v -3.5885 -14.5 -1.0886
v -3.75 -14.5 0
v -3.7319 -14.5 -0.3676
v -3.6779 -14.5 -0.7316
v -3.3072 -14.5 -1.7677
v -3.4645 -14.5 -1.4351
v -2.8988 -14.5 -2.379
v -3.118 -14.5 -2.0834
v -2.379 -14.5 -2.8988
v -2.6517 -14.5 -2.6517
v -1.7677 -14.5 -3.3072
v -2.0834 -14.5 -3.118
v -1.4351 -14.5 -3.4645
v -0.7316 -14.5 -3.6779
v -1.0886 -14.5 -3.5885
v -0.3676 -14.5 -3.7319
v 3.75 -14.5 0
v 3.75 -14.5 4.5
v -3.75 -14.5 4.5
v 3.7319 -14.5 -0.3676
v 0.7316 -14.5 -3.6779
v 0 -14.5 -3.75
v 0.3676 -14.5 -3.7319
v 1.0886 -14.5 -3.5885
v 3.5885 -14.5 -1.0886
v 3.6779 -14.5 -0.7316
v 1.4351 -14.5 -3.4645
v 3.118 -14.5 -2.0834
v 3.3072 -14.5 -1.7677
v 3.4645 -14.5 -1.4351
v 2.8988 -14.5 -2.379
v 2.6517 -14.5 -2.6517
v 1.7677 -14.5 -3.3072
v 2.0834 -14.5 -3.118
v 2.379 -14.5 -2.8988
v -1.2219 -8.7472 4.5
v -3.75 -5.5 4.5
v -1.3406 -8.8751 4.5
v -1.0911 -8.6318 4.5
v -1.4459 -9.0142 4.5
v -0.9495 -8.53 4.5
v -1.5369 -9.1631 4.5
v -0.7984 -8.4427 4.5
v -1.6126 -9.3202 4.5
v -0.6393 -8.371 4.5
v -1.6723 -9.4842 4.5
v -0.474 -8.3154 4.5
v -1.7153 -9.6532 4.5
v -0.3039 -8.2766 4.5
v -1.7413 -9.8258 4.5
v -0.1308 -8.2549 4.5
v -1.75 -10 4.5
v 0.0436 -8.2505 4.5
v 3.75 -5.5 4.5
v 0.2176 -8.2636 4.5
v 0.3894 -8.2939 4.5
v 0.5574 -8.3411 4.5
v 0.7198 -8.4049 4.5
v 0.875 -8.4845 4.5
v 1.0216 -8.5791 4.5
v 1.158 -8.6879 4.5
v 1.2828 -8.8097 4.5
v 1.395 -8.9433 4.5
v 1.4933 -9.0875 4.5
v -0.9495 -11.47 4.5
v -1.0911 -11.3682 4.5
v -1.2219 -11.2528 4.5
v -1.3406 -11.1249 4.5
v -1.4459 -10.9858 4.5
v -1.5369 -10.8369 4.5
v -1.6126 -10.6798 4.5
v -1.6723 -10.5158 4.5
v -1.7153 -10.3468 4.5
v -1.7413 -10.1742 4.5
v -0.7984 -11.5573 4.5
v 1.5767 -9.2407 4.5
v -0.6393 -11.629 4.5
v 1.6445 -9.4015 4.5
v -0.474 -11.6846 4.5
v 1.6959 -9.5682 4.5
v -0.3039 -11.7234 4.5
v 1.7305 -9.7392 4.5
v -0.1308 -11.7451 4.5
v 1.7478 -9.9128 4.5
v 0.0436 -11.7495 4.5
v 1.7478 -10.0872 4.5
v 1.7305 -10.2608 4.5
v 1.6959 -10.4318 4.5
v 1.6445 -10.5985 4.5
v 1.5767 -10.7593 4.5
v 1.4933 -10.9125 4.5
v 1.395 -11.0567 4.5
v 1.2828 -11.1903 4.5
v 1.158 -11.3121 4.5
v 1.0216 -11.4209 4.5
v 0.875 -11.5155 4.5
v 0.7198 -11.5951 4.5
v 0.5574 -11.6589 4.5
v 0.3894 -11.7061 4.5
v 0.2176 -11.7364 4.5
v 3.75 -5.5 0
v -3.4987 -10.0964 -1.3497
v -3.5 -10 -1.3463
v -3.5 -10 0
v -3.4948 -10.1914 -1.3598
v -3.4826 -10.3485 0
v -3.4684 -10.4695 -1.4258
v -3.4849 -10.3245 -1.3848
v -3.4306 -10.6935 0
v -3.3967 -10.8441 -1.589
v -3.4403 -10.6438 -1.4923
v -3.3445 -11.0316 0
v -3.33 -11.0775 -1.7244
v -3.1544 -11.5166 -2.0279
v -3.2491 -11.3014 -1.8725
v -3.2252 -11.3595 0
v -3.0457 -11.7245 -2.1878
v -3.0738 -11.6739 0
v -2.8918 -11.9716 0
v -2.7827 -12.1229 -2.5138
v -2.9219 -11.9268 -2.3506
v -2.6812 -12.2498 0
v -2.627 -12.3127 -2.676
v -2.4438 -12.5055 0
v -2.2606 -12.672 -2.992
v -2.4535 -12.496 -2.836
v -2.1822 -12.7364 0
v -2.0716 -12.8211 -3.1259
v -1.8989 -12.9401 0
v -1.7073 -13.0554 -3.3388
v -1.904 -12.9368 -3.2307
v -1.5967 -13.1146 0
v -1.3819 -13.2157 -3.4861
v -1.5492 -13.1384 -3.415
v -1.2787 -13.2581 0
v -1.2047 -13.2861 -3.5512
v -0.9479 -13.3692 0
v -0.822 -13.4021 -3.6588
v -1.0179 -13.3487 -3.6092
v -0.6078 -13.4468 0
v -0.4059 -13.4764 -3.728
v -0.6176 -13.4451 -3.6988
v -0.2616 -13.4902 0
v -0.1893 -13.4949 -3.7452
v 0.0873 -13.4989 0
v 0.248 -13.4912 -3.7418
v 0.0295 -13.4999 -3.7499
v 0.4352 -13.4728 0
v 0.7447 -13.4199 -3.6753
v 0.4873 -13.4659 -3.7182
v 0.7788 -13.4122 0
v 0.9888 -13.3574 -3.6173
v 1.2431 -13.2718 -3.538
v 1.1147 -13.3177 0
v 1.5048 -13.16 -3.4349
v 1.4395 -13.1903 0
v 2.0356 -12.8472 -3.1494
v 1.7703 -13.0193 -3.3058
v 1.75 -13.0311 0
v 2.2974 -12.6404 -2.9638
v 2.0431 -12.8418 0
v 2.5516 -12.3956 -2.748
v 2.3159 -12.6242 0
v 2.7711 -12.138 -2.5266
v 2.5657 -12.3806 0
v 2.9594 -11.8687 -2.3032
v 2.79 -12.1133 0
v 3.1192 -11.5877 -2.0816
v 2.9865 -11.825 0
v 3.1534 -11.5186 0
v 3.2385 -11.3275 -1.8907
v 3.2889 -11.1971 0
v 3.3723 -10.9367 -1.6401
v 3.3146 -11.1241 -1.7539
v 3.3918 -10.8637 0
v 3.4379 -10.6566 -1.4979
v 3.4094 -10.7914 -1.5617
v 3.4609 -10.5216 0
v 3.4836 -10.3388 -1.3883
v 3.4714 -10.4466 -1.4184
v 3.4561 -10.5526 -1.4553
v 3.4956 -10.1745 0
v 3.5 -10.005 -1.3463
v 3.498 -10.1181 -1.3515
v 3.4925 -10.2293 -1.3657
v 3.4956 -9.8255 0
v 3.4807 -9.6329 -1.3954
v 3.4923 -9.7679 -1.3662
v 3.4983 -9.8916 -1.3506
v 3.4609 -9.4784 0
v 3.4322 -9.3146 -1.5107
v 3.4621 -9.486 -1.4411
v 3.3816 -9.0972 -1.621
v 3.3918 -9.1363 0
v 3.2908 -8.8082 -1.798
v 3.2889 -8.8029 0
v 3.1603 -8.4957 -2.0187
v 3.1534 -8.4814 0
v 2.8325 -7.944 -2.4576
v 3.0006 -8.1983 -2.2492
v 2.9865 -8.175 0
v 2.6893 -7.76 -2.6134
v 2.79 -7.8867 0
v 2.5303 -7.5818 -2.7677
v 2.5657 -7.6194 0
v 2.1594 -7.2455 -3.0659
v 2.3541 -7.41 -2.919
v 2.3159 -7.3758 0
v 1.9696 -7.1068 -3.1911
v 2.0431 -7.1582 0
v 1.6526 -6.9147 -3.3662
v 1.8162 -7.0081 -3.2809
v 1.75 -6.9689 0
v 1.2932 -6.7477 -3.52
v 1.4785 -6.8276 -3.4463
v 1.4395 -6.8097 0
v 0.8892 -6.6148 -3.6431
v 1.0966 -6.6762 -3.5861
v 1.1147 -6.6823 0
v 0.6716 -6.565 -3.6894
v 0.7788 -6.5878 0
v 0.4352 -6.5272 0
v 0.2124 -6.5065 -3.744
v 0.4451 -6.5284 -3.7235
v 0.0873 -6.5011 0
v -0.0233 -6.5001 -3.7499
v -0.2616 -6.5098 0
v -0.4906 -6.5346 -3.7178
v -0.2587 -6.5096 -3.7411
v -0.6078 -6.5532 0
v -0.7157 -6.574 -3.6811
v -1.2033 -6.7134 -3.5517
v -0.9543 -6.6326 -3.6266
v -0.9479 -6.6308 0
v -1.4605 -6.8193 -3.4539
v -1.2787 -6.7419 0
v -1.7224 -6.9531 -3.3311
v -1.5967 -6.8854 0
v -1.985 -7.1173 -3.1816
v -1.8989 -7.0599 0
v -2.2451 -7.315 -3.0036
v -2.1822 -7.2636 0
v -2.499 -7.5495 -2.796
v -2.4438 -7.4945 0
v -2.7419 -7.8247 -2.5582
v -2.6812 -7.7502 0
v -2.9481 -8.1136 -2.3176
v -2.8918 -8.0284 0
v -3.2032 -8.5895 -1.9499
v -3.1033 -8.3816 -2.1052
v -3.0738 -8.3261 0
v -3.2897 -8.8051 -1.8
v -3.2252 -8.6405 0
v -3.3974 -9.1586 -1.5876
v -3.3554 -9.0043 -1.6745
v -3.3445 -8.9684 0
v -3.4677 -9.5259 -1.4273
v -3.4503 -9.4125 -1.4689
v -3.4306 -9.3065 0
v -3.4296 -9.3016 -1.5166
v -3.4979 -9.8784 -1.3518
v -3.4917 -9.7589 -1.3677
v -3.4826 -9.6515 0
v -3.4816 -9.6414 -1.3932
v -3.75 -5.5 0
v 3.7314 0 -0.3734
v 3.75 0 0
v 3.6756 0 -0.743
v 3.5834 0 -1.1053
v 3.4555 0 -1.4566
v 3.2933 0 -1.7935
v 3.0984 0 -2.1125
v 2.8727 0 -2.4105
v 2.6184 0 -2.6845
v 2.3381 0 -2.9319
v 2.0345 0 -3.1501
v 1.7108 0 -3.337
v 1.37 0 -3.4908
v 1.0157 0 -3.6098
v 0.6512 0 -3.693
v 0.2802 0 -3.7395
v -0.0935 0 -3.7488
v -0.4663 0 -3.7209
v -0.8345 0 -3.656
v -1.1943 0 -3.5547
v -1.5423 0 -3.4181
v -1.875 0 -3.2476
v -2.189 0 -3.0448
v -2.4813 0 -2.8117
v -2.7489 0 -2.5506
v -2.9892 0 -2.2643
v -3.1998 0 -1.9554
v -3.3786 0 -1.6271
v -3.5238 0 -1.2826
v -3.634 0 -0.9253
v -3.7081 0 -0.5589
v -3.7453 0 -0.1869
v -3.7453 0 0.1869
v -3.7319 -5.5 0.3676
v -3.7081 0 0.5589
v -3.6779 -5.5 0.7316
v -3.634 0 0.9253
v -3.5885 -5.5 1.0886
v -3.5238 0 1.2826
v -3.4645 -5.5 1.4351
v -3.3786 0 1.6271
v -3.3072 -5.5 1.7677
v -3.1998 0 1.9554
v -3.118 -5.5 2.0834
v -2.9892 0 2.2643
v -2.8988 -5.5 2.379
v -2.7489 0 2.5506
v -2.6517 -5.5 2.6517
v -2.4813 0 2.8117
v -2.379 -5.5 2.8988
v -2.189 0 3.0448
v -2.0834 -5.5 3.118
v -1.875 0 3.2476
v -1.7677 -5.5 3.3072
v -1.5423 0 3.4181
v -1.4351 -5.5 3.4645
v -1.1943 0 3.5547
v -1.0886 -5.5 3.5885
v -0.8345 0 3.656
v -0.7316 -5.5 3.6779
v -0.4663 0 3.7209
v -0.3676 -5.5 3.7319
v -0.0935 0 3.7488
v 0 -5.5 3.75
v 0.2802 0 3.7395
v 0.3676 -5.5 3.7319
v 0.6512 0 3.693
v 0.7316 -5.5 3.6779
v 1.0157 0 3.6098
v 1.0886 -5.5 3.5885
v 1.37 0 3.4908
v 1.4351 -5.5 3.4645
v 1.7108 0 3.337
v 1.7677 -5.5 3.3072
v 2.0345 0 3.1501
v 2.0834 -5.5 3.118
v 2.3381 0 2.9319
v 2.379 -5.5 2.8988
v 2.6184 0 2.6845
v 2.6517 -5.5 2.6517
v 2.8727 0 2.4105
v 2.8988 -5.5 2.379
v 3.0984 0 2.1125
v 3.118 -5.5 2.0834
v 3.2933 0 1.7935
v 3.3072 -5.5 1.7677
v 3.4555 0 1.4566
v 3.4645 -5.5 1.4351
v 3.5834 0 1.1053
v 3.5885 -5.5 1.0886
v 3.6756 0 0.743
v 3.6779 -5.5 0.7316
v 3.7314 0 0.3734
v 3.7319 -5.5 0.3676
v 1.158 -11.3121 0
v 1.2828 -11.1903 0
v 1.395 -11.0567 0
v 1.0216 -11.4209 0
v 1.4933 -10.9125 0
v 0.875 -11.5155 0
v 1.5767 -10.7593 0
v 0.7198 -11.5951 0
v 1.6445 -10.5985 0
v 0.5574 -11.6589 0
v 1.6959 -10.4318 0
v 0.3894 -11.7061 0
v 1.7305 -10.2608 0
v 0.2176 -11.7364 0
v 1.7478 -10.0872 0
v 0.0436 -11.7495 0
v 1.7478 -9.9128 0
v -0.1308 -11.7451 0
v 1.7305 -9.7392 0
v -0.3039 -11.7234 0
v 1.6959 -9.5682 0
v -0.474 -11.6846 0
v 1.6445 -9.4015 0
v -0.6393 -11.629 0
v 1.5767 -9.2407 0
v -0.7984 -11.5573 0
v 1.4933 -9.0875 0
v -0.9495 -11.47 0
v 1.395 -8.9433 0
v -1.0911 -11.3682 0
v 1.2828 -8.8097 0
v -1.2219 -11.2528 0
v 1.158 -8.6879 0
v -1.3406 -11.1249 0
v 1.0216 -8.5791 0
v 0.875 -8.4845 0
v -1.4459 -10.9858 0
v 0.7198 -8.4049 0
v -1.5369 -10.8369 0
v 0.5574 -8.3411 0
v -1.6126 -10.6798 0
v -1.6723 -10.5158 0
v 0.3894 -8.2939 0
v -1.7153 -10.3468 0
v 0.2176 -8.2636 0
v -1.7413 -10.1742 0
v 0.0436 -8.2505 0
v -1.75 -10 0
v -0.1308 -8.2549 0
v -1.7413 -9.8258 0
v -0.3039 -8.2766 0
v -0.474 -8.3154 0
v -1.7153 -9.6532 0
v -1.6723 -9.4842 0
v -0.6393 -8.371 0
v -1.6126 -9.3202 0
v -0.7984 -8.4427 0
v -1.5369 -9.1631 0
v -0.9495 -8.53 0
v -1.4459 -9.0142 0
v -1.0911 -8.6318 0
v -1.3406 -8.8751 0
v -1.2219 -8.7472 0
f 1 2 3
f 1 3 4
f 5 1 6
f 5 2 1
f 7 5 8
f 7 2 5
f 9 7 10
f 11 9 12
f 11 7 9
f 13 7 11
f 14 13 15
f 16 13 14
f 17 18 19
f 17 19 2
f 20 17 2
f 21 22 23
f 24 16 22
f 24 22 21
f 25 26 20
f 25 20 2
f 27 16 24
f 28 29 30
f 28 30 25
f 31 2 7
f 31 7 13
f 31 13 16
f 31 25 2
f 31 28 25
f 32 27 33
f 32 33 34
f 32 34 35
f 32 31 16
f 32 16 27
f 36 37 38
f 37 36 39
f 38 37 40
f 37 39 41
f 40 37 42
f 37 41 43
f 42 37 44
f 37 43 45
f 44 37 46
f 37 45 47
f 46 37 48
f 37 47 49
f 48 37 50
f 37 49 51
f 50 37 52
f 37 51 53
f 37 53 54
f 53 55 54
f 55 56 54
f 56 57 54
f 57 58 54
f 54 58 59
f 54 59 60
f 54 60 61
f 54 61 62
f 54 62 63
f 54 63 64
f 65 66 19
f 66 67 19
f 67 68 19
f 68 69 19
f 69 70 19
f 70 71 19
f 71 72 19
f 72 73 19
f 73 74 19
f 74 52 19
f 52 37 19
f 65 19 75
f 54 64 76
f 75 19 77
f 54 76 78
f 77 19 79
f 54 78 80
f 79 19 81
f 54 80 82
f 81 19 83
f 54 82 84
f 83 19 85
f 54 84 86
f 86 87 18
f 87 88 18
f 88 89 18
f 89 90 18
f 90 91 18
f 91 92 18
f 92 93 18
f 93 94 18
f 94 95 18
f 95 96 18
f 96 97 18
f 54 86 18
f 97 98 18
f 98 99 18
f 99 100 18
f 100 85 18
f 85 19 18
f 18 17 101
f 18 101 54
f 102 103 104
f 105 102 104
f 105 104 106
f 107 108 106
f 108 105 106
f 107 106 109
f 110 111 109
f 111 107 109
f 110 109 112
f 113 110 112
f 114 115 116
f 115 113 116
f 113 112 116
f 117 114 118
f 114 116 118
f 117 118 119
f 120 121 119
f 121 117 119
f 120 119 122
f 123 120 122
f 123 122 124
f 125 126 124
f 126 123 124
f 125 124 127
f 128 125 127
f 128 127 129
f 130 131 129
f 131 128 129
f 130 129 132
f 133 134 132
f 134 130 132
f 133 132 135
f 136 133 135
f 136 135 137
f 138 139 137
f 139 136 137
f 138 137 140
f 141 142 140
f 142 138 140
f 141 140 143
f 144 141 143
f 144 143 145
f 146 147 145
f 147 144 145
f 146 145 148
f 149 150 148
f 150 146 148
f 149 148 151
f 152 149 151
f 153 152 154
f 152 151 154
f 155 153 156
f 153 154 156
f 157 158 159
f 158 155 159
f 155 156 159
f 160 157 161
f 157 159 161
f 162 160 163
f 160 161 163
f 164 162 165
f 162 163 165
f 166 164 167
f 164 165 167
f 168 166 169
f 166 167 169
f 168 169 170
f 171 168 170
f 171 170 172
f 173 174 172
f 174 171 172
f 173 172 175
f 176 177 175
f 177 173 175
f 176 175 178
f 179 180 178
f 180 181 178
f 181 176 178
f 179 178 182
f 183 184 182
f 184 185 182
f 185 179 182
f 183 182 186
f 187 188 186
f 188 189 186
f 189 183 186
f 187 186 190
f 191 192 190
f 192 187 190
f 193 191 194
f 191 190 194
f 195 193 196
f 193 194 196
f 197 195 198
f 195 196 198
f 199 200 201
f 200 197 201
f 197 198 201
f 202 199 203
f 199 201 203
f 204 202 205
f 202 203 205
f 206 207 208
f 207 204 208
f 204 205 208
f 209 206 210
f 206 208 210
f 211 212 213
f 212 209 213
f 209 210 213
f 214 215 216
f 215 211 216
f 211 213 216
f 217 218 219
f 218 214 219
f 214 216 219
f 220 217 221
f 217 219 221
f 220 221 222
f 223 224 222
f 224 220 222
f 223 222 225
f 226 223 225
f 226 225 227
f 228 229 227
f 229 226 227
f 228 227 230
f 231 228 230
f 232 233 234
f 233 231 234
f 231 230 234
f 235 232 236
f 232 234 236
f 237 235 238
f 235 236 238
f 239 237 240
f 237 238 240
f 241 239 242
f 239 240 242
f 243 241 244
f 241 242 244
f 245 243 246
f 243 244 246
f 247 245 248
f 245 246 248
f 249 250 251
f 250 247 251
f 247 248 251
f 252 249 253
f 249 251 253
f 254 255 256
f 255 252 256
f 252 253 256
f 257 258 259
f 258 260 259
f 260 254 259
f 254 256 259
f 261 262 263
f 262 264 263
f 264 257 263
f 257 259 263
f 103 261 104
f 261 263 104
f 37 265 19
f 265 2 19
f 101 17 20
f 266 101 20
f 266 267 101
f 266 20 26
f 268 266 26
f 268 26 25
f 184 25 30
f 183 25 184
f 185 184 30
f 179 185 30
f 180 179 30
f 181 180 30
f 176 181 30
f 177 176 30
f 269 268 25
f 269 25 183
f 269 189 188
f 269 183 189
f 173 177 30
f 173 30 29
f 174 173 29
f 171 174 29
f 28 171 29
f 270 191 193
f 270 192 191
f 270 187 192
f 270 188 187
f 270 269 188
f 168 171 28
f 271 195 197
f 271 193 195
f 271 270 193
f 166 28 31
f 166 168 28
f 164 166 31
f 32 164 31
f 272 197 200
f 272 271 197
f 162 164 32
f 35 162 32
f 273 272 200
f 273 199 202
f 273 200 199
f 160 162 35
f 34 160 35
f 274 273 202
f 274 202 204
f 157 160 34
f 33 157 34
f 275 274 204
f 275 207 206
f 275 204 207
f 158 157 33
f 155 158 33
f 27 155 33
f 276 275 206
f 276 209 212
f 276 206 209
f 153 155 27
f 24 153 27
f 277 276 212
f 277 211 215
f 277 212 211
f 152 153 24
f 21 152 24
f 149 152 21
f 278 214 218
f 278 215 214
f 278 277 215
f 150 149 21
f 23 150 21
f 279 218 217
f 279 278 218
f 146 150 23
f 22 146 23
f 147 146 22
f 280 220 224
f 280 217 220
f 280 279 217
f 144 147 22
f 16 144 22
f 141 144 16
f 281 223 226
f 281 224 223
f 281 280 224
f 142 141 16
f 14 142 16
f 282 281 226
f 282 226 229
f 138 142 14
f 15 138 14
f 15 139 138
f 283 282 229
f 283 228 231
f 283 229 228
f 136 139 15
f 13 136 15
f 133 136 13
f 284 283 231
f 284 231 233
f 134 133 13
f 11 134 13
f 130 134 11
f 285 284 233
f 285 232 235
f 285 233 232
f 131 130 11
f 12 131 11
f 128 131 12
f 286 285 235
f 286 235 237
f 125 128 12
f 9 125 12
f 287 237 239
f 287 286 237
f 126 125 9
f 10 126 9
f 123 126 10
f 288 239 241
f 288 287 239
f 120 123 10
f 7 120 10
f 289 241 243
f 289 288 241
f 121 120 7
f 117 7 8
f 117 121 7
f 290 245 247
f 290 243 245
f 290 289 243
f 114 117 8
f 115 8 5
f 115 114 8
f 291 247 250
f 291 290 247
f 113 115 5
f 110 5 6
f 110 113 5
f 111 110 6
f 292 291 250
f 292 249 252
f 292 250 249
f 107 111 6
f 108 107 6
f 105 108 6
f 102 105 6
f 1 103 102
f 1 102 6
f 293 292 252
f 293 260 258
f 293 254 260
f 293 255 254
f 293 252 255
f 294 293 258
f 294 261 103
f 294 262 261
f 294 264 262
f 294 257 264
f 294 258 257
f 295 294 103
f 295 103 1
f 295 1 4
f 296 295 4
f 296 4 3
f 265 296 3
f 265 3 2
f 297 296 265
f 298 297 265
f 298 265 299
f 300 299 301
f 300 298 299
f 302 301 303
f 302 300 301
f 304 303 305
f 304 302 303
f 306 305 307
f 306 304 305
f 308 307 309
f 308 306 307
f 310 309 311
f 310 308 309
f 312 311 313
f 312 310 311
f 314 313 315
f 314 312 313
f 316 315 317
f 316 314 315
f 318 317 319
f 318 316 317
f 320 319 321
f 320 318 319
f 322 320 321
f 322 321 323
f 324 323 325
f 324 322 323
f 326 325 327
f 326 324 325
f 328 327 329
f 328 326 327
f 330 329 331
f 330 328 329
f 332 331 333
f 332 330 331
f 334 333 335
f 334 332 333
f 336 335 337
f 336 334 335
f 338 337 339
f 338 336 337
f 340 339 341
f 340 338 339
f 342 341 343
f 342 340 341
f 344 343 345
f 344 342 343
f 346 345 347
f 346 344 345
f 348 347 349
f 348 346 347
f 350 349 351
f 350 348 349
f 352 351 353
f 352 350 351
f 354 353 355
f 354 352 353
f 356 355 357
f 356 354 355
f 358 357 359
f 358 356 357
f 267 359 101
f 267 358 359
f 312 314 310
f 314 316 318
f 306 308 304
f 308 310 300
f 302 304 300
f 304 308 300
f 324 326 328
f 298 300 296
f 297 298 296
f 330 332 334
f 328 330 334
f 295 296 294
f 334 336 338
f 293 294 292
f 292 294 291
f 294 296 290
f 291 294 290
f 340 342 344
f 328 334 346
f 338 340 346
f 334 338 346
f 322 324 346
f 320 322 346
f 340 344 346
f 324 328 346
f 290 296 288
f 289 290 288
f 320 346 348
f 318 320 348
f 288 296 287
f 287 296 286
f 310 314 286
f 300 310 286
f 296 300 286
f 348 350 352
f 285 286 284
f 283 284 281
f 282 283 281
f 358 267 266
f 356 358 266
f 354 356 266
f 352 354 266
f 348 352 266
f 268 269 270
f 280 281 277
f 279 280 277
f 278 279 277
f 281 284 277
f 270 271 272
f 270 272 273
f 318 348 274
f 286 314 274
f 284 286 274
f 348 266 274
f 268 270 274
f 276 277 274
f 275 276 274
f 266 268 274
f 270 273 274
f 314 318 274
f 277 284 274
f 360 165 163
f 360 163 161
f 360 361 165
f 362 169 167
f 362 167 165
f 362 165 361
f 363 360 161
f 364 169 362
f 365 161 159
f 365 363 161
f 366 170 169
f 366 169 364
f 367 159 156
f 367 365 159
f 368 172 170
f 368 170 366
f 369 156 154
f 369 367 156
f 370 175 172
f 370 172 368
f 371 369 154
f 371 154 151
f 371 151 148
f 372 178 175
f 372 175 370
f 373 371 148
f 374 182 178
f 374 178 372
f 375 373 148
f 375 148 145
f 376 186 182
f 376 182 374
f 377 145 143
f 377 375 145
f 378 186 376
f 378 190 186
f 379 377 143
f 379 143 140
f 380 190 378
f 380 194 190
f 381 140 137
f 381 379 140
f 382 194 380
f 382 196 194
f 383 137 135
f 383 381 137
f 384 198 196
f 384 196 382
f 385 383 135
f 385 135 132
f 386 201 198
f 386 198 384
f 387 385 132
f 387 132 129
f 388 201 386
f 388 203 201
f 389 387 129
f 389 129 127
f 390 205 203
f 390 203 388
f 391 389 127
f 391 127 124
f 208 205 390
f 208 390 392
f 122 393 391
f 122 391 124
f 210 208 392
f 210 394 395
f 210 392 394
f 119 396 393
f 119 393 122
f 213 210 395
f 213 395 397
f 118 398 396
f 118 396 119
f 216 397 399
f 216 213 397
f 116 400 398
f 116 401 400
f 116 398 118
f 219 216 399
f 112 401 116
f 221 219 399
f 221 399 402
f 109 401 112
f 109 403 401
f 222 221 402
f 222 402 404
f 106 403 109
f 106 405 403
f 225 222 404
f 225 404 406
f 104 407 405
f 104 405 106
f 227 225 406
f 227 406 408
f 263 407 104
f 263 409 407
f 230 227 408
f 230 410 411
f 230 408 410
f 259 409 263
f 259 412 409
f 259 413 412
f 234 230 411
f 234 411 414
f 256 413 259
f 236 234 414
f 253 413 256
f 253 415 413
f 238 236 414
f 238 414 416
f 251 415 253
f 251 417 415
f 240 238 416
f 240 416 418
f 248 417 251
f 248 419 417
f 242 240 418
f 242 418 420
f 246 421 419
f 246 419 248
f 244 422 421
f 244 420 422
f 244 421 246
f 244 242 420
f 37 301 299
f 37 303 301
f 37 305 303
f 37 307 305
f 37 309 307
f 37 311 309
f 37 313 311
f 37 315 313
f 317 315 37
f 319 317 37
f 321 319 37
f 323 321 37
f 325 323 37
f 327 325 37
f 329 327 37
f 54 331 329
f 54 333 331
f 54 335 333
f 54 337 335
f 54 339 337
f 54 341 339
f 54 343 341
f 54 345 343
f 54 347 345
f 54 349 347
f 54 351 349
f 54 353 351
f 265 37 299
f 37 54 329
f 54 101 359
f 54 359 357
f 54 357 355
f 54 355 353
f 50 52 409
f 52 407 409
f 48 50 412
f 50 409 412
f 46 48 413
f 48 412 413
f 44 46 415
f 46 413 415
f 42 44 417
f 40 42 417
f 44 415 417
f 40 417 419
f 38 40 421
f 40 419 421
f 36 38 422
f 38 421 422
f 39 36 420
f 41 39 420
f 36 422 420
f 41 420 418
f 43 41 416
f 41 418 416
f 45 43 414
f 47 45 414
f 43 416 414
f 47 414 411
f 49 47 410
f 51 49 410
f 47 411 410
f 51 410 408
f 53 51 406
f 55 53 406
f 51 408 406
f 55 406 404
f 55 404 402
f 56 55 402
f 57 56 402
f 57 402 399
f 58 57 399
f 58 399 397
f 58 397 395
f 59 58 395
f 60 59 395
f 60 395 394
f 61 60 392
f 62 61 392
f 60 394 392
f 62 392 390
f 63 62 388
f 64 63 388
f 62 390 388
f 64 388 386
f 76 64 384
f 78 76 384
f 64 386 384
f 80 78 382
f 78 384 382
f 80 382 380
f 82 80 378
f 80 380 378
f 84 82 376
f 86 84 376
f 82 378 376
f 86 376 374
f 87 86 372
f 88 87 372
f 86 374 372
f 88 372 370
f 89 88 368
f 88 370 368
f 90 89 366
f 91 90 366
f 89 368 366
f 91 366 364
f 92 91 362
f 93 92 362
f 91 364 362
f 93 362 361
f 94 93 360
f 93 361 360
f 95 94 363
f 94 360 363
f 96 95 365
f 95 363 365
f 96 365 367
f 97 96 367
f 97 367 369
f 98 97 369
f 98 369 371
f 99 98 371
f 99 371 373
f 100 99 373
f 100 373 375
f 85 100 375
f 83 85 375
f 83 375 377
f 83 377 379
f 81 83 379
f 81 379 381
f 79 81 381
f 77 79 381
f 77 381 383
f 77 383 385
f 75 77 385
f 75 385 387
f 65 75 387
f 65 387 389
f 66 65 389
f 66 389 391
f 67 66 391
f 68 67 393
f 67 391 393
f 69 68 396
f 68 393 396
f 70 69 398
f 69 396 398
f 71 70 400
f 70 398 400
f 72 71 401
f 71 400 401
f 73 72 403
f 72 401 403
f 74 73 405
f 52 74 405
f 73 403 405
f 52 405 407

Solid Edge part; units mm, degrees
sketch "Sketch1" plane through (0, 0, 0) normal (0, -1, 0) x (1, 0, 0)
  circle A0 centre (0, 0) radius 3.75
extrude "Protrusion1" add sketch "Sketch1" along normal blind 14.5
sketch "Sketch2" plane through (0, -14.5, 0) normal (0, -1, 0) x (1, 0, 0)
  line L0 (-3.75, 4.5) -> (3.75, 4.5)
  line L1 (3.75, 0) -> (3.75, 4.5)
  line L2 (-3.75, 0) -> (3.75, 0)
  line L3 (-3.75, 0) -> (-3.75, 4.5)
extrude "ExtrudedCutout_1" add sketch "Sketch2" against normal blind 9
sketch "Sketch3" plane through (0, 0, 0) normal (0, 0, -1) x (-1, 0, 0)
  circle A0 centre (0, -10) radius 3.5
extrude "ExtrudedCutout_4" cut sketch "Sketch3" along normal blind 4
sketch "Sketch4" plane through (0, 0, 0) normal (0, 0, -1) x (-1, 0, 0)
  circle A0 centre (0, -10) radius 1.75
extrude "Cutout1" cut sketch "Sketch4" against normal up to vertex (4.5 mm away)
properties material "Polycarbonate"
